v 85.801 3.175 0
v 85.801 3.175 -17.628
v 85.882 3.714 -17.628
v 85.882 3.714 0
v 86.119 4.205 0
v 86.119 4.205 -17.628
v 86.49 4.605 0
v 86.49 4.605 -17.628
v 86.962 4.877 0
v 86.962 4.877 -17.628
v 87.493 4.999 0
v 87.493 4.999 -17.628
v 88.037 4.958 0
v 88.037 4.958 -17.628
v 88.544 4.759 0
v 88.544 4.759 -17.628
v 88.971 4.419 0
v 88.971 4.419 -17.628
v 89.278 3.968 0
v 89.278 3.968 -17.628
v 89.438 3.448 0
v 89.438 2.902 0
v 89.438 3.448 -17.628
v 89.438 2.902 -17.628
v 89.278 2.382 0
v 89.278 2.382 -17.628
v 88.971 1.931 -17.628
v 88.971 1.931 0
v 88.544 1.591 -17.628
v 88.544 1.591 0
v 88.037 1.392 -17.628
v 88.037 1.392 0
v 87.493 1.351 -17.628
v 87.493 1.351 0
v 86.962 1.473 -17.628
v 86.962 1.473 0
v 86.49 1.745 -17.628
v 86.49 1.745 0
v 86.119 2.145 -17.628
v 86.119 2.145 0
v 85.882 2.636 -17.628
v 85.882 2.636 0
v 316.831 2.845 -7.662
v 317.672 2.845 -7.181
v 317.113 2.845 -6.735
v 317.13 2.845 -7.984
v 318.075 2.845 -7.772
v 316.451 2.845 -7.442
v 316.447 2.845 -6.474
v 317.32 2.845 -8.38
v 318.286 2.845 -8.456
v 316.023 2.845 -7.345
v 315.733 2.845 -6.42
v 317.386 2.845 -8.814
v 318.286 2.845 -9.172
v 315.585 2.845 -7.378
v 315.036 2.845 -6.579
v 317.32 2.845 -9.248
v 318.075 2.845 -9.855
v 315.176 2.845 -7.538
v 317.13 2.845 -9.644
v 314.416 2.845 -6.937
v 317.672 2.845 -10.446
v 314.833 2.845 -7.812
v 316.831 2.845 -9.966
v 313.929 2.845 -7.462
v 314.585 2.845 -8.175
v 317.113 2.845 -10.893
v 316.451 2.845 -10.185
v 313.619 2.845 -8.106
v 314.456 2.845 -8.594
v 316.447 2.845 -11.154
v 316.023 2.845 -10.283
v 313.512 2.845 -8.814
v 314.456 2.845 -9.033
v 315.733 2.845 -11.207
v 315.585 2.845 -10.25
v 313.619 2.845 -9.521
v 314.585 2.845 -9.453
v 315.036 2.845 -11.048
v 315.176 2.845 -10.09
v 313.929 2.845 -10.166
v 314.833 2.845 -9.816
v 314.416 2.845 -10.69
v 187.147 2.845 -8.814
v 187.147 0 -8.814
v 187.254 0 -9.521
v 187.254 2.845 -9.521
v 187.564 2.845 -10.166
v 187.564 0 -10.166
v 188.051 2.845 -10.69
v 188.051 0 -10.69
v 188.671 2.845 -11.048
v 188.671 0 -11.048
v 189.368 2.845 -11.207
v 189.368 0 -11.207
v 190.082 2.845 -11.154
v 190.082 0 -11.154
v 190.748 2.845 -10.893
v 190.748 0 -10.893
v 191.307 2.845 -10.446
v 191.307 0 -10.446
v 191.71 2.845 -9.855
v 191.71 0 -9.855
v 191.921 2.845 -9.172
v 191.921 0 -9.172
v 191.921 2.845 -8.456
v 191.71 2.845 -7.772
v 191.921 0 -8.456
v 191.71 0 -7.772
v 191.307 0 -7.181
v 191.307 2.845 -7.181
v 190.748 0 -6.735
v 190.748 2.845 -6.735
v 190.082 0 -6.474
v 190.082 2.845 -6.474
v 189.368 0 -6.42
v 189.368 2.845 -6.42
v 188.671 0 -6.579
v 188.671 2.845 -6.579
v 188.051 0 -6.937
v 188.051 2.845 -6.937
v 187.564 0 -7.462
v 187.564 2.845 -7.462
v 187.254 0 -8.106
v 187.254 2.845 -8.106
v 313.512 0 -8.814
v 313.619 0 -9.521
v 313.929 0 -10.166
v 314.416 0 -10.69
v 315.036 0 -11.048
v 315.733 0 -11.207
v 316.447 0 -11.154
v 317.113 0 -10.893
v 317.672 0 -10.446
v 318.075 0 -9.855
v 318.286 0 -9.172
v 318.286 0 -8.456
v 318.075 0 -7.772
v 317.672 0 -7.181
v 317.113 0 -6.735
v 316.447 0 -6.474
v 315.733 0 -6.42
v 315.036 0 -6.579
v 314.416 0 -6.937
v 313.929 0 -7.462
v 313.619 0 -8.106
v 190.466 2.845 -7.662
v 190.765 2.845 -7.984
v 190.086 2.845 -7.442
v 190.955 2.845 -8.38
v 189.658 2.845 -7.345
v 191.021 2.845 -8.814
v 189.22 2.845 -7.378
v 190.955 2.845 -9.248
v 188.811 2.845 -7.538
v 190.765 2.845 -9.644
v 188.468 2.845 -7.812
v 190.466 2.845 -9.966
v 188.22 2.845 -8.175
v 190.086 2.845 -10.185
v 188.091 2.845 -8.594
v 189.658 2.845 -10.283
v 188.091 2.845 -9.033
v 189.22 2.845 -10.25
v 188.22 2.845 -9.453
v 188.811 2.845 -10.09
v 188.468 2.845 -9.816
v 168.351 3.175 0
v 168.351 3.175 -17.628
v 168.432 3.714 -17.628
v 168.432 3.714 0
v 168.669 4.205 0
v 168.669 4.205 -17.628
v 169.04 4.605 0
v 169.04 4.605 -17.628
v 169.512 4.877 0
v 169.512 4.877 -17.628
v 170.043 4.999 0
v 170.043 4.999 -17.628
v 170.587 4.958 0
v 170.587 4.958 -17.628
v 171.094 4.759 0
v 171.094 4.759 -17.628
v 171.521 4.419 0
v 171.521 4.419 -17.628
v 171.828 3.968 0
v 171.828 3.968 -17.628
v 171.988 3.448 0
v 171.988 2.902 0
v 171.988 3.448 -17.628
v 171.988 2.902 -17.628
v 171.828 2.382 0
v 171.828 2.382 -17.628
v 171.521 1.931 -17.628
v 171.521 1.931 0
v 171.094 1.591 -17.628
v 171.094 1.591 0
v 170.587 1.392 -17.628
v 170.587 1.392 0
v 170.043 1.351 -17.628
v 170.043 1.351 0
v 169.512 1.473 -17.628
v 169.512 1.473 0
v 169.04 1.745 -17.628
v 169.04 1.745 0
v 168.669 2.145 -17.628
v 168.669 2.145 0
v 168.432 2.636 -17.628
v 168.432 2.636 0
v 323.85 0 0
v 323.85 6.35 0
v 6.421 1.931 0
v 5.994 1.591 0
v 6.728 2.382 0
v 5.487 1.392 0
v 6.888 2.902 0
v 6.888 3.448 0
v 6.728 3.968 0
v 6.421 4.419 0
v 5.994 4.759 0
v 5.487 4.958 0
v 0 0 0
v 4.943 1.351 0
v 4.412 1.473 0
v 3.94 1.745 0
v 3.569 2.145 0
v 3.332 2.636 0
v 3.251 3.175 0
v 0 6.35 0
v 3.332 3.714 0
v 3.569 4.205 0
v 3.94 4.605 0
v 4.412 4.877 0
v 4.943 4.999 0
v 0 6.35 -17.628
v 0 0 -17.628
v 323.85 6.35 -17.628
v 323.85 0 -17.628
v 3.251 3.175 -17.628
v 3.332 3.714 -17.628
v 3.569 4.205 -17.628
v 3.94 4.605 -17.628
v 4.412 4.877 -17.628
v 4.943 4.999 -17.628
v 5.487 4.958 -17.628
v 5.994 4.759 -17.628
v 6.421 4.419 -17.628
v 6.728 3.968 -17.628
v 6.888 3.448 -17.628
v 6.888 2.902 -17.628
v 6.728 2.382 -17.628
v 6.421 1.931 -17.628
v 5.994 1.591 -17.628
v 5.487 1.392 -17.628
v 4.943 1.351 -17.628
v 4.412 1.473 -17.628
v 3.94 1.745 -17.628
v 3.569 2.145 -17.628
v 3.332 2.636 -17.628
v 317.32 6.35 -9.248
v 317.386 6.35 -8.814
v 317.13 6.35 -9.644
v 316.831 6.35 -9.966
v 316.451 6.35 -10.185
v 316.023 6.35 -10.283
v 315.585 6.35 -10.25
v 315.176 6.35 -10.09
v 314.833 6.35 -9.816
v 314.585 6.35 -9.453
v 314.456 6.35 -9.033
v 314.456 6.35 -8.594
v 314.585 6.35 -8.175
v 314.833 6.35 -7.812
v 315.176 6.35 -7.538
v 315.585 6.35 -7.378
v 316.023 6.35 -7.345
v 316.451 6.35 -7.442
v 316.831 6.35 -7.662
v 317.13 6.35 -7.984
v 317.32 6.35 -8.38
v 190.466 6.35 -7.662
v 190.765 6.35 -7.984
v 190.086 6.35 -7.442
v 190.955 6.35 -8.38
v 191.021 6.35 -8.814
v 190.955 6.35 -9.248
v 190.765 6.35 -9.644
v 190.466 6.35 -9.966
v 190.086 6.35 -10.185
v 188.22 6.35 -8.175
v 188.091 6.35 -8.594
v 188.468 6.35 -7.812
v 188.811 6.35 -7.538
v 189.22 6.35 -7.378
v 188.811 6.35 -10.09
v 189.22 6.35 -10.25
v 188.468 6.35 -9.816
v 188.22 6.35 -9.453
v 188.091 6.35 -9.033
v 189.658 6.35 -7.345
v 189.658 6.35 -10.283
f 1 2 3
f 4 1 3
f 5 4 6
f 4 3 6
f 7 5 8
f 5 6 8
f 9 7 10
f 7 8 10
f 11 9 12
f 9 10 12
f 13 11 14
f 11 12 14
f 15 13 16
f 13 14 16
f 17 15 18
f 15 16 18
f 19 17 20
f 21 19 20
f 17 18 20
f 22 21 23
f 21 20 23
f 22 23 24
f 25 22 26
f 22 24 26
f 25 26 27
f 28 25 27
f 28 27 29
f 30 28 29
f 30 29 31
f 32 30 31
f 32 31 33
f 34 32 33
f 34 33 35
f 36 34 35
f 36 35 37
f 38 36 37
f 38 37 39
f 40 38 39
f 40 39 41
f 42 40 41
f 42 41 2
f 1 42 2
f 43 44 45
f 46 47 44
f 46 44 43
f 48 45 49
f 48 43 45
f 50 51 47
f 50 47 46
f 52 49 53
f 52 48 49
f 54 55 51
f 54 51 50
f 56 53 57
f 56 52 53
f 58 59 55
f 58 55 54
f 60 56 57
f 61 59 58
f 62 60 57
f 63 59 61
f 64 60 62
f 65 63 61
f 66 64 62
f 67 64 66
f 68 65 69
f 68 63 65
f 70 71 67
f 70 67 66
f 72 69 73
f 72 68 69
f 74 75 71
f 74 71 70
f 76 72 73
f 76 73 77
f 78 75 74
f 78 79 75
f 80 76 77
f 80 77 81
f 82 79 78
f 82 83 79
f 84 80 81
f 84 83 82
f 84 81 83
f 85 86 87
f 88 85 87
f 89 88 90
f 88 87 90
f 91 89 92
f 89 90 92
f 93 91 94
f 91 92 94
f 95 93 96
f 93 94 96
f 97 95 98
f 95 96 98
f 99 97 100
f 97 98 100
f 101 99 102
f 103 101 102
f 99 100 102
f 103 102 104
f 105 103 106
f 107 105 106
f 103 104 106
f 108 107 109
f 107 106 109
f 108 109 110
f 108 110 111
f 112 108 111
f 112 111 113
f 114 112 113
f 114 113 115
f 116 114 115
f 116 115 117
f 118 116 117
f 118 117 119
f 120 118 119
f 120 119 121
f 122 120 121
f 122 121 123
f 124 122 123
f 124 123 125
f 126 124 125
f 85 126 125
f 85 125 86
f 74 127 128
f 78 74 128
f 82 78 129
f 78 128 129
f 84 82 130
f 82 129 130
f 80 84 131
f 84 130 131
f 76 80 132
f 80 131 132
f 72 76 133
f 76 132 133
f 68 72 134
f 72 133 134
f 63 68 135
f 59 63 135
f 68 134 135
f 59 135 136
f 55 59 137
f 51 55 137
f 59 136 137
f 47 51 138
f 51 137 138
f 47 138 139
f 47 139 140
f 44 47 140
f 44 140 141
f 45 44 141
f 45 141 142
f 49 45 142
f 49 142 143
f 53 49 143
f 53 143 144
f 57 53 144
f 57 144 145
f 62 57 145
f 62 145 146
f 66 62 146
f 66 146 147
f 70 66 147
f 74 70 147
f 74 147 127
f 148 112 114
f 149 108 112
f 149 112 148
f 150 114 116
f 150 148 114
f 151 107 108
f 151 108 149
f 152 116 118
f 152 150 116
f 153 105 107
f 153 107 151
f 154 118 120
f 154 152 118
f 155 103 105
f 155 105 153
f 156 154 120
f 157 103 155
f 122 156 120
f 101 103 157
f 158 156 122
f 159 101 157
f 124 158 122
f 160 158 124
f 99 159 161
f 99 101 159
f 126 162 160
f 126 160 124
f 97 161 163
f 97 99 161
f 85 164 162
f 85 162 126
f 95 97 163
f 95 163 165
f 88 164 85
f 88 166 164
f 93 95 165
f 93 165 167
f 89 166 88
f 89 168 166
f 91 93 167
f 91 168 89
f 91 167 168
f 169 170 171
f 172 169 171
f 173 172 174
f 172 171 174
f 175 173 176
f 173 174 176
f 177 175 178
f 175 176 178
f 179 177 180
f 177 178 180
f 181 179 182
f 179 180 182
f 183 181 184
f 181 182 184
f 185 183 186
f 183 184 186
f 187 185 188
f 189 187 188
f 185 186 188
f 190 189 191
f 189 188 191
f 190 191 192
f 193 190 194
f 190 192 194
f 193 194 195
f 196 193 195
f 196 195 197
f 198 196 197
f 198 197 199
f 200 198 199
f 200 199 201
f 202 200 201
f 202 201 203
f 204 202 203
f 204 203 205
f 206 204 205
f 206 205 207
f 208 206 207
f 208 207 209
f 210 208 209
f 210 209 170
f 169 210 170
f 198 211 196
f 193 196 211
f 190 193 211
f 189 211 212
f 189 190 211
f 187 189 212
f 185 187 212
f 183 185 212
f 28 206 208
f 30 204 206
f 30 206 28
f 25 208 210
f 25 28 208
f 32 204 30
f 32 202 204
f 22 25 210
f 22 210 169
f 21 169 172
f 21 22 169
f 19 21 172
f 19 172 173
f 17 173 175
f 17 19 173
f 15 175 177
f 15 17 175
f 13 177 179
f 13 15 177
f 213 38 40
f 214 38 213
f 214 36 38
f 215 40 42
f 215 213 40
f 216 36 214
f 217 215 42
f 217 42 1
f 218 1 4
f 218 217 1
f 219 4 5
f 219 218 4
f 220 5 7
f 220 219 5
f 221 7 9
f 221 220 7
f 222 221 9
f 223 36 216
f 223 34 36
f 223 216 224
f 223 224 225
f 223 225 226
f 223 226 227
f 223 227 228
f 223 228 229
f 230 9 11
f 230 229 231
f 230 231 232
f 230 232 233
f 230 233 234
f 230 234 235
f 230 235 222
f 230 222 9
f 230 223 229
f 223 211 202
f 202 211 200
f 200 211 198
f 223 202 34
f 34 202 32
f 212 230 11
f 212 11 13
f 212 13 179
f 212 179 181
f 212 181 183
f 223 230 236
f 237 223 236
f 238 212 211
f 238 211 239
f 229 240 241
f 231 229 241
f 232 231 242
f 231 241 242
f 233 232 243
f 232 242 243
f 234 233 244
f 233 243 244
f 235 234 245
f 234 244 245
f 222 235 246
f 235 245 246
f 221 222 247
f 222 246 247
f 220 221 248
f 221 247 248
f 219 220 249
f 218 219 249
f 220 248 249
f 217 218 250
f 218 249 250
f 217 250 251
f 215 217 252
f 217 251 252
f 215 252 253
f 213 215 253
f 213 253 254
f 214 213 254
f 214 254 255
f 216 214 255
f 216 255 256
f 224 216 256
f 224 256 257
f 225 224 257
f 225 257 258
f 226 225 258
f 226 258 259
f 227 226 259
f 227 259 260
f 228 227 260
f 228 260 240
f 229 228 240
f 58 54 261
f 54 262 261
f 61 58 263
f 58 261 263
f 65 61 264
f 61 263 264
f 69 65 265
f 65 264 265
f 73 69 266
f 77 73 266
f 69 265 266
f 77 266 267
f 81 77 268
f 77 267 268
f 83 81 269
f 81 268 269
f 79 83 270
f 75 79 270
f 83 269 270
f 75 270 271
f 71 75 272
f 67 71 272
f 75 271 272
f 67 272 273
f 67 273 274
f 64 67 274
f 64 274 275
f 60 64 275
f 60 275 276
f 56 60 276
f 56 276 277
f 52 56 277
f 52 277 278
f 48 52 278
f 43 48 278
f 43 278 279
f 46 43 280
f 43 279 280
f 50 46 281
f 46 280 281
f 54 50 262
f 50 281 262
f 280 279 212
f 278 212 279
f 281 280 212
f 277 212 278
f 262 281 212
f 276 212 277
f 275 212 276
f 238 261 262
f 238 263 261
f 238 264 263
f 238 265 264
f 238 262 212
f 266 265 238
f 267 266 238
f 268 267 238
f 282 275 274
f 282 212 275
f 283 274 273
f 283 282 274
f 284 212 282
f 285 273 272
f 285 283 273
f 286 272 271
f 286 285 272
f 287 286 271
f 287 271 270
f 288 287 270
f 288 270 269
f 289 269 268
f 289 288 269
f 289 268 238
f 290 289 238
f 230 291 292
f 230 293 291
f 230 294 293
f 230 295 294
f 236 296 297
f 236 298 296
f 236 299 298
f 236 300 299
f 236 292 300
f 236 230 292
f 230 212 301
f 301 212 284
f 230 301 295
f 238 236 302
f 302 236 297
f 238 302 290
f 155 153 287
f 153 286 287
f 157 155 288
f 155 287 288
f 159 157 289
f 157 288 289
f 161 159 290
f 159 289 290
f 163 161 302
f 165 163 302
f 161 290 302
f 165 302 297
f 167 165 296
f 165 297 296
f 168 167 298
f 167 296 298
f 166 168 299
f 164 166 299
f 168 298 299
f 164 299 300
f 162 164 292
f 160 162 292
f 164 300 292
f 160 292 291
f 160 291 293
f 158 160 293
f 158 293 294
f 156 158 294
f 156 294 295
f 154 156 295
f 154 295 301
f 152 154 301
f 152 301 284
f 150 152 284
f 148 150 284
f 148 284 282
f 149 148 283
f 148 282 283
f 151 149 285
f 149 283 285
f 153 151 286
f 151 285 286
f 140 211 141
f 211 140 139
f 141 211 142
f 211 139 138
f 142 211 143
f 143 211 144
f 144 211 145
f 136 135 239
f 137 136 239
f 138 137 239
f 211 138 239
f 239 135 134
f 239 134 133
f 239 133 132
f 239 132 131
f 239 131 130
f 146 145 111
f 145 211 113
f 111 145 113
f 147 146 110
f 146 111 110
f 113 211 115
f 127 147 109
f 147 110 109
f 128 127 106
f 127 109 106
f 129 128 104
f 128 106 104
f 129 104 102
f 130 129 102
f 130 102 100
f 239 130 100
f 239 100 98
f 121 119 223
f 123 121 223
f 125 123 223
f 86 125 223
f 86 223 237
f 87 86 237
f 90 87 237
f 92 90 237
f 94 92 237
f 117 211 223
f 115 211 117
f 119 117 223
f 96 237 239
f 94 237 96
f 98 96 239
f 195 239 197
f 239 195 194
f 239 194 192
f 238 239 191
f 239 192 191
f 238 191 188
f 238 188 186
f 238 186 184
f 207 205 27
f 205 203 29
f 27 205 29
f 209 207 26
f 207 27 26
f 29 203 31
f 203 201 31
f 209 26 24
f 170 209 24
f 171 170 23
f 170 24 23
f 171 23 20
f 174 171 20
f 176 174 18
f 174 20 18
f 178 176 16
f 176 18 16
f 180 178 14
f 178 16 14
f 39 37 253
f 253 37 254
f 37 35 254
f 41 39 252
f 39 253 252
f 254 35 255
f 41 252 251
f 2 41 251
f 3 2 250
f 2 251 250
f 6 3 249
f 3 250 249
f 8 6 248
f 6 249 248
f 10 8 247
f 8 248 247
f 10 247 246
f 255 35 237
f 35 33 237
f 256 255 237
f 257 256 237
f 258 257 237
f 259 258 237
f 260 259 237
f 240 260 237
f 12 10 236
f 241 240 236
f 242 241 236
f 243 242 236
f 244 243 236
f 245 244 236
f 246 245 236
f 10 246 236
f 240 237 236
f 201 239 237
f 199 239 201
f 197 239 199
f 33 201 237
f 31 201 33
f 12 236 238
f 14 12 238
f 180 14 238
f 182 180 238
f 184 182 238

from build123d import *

# Parameters (mm, degrees)
SKETCH1_W                                           = 17.6276
SKETCH1_H                                           = 6.35
BOSS_EXTRUDE1_DEPTH                                 = 323.85
F_6_CLEARANCE_HOLE1_D                               = 3.6576
CBORE_FOR_4_BINDING_HEAD_MACHINE_SCREW2_D           = 2.9464
CBORE_FOR_4_BINDING_HEAD_MACHINE_SCREW2_CBORE_D     = 4.8006
CBORE_FOR_4_BINDING_HEAD_MACHINE_SCREW2_CBORE_DEPTH = 2.8448


with BuildPart() as part:
    # Sketch1 → Boss-Extrude1 (new body)
    with BuildSketch(Plane(origin=(0, 0, 0), x_dir=(0, 0, -1), z_dir=(1, 0, 0))):
        with Locations((8.8138, 3.175)):
            Rectangle(SKETCH1_W, SKETCH1_H)
    extrude(amount=BOSS_EXTRUDE1_DEPTH)

    # #6 Clearance Hole1 (through all)
    with Locations(Plane.XY):
        with Locations((5.08, 3.175), (87.63, 3.175), (170.18, 3.175)):
            Hole(F_6_CLEARANCE_HOLE1_D / 2)

    # CBORE for #4 Binding Head Machine Screw2 (through all)
    with Locations(Plane(origin=(0, 0, 0), x_dir=(-1, 0, 0), z_dir=(0, -1, 0))):
        with Locations((-315.9125, 8.8138), (-189.5475, 8.8138)):
            CounterBoreHole(CBORE_FOR_4_BINDING_HEAD_MACHINE_SCREW2_D / 2, CBORE_FOR_4_BINDING_HEAD_MACHINE_SCREW2_CBORE_D / 2, CBORE_FOR_4_BINDING_HEAD_MACHINE_SCREW2_CBORE_DEPTH)


solid = part.part
